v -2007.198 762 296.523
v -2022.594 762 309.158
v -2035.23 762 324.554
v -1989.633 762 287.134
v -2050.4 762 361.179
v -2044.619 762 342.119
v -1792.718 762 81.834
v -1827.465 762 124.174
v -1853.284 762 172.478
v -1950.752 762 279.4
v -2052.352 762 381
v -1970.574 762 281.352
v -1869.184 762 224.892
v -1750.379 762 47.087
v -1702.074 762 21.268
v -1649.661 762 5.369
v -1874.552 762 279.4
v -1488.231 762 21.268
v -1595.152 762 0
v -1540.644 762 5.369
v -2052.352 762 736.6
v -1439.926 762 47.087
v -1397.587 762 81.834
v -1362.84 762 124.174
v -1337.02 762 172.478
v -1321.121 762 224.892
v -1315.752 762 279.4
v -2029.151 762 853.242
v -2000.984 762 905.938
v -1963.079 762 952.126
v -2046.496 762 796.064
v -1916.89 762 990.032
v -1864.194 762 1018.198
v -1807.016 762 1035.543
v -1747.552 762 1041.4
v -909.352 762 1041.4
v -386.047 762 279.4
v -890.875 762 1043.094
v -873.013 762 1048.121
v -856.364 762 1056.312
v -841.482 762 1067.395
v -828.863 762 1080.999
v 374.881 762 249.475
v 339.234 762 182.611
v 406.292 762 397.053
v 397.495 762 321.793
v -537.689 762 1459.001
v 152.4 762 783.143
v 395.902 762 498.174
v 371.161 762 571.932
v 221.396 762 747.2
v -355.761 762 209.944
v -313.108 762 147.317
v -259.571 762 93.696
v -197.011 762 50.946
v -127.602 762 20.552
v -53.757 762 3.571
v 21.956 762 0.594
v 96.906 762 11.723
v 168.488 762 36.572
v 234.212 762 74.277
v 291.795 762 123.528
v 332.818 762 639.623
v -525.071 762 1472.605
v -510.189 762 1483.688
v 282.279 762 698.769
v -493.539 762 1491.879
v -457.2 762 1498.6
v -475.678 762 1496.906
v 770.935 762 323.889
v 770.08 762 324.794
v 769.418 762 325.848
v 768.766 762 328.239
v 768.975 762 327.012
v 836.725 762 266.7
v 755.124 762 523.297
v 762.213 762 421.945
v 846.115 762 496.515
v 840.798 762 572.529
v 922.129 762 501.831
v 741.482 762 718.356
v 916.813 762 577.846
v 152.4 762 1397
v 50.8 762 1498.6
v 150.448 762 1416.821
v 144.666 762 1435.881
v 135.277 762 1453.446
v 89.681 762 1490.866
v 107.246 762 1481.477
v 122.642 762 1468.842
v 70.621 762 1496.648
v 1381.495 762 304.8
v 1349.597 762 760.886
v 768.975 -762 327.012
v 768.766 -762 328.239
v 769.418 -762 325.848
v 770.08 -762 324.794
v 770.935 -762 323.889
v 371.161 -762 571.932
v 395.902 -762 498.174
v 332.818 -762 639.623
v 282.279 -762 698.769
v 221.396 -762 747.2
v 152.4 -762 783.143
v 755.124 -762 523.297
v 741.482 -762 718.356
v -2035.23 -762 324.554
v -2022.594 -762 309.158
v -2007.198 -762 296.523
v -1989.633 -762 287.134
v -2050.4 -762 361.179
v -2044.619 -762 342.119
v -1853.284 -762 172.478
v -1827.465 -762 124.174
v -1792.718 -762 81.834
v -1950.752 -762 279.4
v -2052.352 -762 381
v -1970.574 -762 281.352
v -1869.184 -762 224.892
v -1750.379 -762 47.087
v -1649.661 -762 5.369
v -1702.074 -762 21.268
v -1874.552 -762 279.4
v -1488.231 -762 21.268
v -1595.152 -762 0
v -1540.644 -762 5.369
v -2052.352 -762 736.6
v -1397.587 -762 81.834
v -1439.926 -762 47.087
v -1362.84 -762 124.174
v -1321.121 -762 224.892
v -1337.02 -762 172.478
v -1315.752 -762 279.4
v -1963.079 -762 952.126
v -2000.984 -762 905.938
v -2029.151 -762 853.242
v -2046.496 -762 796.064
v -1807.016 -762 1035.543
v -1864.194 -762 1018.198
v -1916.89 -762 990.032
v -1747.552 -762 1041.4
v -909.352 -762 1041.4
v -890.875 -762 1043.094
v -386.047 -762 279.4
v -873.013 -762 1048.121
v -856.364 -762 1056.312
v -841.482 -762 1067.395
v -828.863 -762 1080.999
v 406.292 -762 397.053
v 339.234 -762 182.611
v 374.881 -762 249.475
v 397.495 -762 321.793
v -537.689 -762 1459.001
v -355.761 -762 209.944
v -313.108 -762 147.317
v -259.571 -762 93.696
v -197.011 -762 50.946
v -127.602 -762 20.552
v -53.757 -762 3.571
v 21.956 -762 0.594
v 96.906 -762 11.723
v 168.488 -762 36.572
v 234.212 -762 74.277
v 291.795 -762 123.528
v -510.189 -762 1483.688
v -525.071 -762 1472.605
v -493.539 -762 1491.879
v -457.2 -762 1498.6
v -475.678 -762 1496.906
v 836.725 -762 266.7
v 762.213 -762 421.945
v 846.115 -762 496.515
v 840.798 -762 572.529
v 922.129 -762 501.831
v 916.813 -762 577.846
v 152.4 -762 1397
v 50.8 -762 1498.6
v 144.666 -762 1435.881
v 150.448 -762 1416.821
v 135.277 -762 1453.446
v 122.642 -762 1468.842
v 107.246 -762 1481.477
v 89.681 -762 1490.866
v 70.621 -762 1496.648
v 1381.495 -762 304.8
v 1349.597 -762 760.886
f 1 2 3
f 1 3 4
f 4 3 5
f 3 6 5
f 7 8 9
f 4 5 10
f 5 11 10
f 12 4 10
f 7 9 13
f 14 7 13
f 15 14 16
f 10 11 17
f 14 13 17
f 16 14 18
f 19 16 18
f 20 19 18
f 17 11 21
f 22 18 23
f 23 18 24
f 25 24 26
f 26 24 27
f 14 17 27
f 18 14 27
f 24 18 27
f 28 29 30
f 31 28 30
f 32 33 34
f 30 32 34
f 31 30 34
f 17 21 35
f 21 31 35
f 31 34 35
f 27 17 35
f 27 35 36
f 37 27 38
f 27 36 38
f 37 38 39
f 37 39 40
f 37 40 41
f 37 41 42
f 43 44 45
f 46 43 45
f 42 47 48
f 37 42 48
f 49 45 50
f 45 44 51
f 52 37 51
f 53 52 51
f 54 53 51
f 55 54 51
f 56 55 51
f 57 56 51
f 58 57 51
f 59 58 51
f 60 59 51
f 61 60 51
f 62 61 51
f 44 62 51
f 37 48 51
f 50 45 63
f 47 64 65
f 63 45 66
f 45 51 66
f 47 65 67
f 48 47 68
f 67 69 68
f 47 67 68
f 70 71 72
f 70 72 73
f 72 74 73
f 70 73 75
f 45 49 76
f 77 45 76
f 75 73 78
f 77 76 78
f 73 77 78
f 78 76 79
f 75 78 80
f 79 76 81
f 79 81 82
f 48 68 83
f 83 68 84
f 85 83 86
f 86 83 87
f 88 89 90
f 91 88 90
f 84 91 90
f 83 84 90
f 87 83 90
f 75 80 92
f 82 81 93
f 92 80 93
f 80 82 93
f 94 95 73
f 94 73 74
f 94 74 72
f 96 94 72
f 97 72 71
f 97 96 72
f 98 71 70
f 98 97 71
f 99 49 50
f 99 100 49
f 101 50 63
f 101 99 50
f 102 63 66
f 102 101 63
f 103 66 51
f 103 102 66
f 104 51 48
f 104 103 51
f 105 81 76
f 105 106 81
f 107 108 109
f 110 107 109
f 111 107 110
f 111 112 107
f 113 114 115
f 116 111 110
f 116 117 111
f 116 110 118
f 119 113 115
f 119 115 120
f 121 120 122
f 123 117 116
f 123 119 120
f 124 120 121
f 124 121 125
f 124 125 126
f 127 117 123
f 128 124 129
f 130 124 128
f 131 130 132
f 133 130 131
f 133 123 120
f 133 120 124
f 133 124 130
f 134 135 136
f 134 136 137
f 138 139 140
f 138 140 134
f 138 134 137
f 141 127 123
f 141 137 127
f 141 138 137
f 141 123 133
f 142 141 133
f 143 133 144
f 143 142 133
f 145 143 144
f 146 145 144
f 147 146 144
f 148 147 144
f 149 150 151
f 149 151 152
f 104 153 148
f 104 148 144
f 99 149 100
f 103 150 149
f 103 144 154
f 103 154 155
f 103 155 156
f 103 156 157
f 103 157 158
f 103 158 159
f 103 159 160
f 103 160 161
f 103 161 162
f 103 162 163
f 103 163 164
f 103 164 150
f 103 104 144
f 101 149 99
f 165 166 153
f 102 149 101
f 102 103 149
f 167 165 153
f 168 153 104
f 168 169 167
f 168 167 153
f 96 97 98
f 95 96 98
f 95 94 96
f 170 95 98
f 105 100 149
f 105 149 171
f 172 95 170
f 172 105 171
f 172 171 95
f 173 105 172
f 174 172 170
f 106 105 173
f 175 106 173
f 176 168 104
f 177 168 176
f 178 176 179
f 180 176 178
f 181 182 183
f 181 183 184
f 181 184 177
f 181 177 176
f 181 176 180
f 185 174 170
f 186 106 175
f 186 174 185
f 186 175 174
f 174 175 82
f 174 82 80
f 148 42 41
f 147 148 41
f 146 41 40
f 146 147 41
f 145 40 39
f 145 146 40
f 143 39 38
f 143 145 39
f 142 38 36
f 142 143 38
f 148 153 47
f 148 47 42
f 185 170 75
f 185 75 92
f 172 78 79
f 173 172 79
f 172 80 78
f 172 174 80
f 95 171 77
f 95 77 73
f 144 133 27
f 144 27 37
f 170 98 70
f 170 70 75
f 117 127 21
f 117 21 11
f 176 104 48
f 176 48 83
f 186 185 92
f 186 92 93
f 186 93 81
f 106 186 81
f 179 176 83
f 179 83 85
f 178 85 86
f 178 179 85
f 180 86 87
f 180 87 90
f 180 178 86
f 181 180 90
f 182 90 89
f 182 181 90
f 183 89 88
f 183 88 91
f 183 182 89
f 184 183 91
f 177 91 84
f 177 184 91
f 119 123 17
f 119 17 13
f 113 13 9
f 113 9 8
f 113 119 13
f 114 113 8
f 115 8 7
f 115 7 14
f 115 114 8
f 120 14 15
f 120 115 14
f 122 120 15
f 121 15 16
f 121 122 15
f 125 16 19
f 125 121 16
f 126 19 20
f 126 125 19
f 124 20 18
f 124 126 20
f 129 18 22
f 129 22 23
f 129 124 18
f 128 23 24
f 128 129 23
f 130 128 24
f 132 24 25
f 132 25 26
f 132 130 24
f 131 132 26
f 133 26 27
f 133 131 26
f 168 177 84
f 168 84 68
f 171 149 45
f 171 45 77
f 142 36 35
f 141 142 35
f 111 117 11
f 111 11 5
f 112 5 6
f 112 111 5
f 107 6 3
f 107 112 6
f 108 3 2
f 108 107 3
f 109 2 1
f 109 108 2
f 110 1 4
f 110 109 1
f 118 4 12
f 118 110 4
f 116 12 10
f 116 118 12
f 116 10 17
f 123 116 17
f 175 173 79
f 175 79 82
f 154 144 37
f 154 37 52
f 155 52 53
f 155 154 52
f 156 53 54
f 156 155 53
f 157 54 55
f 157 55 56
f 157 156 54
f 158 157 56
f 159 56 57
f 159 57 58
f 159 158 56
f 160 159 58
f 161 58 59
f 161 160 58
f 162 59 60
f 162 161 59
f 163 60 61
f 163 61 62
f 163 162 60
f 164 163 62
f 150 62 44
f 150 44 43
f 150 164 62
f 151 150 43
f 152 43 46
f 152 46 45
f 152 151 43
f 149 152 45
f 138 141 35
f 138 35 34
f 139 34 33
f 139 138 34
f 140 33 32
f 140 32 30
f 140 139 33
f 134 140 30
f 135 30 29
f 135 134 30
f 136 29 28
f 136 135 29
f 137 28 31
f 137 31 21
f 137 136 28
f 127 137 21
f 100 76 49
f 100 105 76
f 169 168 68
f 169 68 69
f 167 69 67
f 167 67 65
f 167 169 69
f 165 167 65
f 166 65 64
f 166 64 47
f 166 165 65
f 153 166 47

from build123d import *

# Parameters (mm, degrees)
F1_DEPTH = 762


with BuildPart() as f1:
    # F0 (on Front) → F1 (new body, symmetric)
    with BuildSketch(Plane.XZ):
        with BuildLine():
            ThreePointArc((406.2924873439, 397.0525550083), (406.3731209471, 401.7259683665), (406.4, 406.4))
            ThreePointArc((406.4, 406.4), (403.766999083, 452.5862582542), (395.9021139197, 498.1740496759))
            ThreePointArc((395.9021139197, 498.1740496759), (308.9670064008, 670.40823653), (152.4, 783.1428831445))
            Line((152.4, 783.1428831445), (152.4, 381))
            ThreePointArc((152.4, 381), (122.6420489686, 309.1579510314), (50.8, 279.4))
            Line((50.8, 279.4), (-386.0465775007, 279.4))
            ThreePointArc((-386.0465775007, 279.4), (59.69091339, 4.4075189028), (406.2924873439, 397.0525550083))
        make_face()
        with BuildLine():
            ThreePointArc((395.9021139197, 498.1740496759), (403.766999083, 452.5862582542), (406.4, 406.4))
            ThreePointArc((406.4, 406.4), (406.3731209471, 401.7259683665), (406.2924873439, 397.0525550083))
            Line((406.2924873439, 397.0525550083), (762.2128270991, 421.9448621212))
            Line((762.2128270991, 421.9448621212), (755.1244550061, 523.2972916977))
            Line((755.1244550061, 523.2972916977), (395.9021139197, 498.1740496759))
        make_face()
        with BuildLine():
            Line((152.4, 381), (152.4, 783.1428831445))
            ThreePointArc((152.4, 783.1428831445), (-277.6452842641, 703.1727348088), (-386.0465775007, 279.4))
            Line((-386.0465775007, 279.4), (50.8, 279.4))
            ThreePointArc((50.8, 279.4), (122.6420489686, 309.1579510314), (152.4, 381))
        make_face()
        with BuildLine():
            ThreePointArc((-386.0465775007, 279.4), (-277.6452842641, 703.1727348088), (152.4, 783.1428831445))
            Line((152.4, 783.1428831445), (152.4, 1397))
            ThreePointArc((152.4, 1397), (122.6420489686, 1468.8420489686), (50.8, 1498.6))
            Line((50.8, 1498.6), (-457.2, 1498.6))
            ThreePointArc((-457.2, 1498.6), (-502.0513814218, 1488.1642121918), (-537.6889931699, 1459.0006611134))
            Line((-537.6889931699, 1459.0006611134), (-828.8633631898, 1080.9993388866))
            ThreePointArc((-828.8633631898, 1080.9993388866), (-864.500974938, 1051.8357878082), (-909.3523563597, 1041.4))
            Line((-909.3523563597, 1041.4), (-1747.5523563597, 1041.4))
            ThreePointArc((-1747.5523563597, 1041.4), (-1963.0785032654, 952.1261469057), (-2052.3523563597, 736.6))
            Line((-2052.3523563597, 736.6), (-2052.3523563597, 381))
            ThreePointArc((-2052.3523563597, 381), (-2022.5944053283, 309.1579510314), (-1950.7523563597, 279.4))
            Line((-1950.7523563597, 279.4), (-1874.5523563597, 279.4))
            ThreePointArc((-1874.5523563597, 279.4), (-1595.1523563597, 558.8), (-1315.7523563597, 279.4))
            Line((-1315.7523563597, 279.4), (-386.0465775007, 279.4))
        make_face()
        with BuildLine():
            Line((741.4824871963, 718.3557005364), (755.1244550061, 523.2972916977))
            Line((755.1244550061, 523.2972916977), (762.2128270991, 421.9448621212))
            Line((762.2128270991, 421.9448621212), (768.7664228158, 328.2388828591))
            ThreePointArc((768.7664228158, 328.2388828591), (769.418147621, 325.8484875196), (770.9350275225, 323.8894544763))
            Line((770.9350275225, 323.8894544763), (836.7254301003, 266.7))
            Line((836.7254301003, 266.7), (1381.4947390743, 304.8))
            Line((1381.4947390743, 304.8), (1349.5970646557, 760.8859330945))
            Line((1349.5970646557, 760.8859330945), (741.4824871963, 718.3557005364))
        make_face()
        Polygon((846.1147002851, 496.5150595705), (840.7984212154, 572.5293817529), (916.8127433978, 577.8456608227), (922.1290224676, 501.8313386403), align=None, mode=Mode.SUBTRACT)
        with BuildLine():
            Line((-1874.5523563597, 279.4), (-1315.7523563597, 279.4))
            ThreePointArc((-1315.7523563597, 279.4), (-1595.1523563597, 558.8), (-1874.5523563597, 279.4))
        make_face()
        with BuildLine():
            ThreePointArc((-1874.5523563597, 279.4), (-1595.1523563597, 0), (-1315.7523563597, 279.4))
            Line((-1315.7523563597, 279.4), (-1874.5523563597, 279.4))
        make_face()
    extrude(amount=F1_DEPTH, both=True)


solid = f1.part
